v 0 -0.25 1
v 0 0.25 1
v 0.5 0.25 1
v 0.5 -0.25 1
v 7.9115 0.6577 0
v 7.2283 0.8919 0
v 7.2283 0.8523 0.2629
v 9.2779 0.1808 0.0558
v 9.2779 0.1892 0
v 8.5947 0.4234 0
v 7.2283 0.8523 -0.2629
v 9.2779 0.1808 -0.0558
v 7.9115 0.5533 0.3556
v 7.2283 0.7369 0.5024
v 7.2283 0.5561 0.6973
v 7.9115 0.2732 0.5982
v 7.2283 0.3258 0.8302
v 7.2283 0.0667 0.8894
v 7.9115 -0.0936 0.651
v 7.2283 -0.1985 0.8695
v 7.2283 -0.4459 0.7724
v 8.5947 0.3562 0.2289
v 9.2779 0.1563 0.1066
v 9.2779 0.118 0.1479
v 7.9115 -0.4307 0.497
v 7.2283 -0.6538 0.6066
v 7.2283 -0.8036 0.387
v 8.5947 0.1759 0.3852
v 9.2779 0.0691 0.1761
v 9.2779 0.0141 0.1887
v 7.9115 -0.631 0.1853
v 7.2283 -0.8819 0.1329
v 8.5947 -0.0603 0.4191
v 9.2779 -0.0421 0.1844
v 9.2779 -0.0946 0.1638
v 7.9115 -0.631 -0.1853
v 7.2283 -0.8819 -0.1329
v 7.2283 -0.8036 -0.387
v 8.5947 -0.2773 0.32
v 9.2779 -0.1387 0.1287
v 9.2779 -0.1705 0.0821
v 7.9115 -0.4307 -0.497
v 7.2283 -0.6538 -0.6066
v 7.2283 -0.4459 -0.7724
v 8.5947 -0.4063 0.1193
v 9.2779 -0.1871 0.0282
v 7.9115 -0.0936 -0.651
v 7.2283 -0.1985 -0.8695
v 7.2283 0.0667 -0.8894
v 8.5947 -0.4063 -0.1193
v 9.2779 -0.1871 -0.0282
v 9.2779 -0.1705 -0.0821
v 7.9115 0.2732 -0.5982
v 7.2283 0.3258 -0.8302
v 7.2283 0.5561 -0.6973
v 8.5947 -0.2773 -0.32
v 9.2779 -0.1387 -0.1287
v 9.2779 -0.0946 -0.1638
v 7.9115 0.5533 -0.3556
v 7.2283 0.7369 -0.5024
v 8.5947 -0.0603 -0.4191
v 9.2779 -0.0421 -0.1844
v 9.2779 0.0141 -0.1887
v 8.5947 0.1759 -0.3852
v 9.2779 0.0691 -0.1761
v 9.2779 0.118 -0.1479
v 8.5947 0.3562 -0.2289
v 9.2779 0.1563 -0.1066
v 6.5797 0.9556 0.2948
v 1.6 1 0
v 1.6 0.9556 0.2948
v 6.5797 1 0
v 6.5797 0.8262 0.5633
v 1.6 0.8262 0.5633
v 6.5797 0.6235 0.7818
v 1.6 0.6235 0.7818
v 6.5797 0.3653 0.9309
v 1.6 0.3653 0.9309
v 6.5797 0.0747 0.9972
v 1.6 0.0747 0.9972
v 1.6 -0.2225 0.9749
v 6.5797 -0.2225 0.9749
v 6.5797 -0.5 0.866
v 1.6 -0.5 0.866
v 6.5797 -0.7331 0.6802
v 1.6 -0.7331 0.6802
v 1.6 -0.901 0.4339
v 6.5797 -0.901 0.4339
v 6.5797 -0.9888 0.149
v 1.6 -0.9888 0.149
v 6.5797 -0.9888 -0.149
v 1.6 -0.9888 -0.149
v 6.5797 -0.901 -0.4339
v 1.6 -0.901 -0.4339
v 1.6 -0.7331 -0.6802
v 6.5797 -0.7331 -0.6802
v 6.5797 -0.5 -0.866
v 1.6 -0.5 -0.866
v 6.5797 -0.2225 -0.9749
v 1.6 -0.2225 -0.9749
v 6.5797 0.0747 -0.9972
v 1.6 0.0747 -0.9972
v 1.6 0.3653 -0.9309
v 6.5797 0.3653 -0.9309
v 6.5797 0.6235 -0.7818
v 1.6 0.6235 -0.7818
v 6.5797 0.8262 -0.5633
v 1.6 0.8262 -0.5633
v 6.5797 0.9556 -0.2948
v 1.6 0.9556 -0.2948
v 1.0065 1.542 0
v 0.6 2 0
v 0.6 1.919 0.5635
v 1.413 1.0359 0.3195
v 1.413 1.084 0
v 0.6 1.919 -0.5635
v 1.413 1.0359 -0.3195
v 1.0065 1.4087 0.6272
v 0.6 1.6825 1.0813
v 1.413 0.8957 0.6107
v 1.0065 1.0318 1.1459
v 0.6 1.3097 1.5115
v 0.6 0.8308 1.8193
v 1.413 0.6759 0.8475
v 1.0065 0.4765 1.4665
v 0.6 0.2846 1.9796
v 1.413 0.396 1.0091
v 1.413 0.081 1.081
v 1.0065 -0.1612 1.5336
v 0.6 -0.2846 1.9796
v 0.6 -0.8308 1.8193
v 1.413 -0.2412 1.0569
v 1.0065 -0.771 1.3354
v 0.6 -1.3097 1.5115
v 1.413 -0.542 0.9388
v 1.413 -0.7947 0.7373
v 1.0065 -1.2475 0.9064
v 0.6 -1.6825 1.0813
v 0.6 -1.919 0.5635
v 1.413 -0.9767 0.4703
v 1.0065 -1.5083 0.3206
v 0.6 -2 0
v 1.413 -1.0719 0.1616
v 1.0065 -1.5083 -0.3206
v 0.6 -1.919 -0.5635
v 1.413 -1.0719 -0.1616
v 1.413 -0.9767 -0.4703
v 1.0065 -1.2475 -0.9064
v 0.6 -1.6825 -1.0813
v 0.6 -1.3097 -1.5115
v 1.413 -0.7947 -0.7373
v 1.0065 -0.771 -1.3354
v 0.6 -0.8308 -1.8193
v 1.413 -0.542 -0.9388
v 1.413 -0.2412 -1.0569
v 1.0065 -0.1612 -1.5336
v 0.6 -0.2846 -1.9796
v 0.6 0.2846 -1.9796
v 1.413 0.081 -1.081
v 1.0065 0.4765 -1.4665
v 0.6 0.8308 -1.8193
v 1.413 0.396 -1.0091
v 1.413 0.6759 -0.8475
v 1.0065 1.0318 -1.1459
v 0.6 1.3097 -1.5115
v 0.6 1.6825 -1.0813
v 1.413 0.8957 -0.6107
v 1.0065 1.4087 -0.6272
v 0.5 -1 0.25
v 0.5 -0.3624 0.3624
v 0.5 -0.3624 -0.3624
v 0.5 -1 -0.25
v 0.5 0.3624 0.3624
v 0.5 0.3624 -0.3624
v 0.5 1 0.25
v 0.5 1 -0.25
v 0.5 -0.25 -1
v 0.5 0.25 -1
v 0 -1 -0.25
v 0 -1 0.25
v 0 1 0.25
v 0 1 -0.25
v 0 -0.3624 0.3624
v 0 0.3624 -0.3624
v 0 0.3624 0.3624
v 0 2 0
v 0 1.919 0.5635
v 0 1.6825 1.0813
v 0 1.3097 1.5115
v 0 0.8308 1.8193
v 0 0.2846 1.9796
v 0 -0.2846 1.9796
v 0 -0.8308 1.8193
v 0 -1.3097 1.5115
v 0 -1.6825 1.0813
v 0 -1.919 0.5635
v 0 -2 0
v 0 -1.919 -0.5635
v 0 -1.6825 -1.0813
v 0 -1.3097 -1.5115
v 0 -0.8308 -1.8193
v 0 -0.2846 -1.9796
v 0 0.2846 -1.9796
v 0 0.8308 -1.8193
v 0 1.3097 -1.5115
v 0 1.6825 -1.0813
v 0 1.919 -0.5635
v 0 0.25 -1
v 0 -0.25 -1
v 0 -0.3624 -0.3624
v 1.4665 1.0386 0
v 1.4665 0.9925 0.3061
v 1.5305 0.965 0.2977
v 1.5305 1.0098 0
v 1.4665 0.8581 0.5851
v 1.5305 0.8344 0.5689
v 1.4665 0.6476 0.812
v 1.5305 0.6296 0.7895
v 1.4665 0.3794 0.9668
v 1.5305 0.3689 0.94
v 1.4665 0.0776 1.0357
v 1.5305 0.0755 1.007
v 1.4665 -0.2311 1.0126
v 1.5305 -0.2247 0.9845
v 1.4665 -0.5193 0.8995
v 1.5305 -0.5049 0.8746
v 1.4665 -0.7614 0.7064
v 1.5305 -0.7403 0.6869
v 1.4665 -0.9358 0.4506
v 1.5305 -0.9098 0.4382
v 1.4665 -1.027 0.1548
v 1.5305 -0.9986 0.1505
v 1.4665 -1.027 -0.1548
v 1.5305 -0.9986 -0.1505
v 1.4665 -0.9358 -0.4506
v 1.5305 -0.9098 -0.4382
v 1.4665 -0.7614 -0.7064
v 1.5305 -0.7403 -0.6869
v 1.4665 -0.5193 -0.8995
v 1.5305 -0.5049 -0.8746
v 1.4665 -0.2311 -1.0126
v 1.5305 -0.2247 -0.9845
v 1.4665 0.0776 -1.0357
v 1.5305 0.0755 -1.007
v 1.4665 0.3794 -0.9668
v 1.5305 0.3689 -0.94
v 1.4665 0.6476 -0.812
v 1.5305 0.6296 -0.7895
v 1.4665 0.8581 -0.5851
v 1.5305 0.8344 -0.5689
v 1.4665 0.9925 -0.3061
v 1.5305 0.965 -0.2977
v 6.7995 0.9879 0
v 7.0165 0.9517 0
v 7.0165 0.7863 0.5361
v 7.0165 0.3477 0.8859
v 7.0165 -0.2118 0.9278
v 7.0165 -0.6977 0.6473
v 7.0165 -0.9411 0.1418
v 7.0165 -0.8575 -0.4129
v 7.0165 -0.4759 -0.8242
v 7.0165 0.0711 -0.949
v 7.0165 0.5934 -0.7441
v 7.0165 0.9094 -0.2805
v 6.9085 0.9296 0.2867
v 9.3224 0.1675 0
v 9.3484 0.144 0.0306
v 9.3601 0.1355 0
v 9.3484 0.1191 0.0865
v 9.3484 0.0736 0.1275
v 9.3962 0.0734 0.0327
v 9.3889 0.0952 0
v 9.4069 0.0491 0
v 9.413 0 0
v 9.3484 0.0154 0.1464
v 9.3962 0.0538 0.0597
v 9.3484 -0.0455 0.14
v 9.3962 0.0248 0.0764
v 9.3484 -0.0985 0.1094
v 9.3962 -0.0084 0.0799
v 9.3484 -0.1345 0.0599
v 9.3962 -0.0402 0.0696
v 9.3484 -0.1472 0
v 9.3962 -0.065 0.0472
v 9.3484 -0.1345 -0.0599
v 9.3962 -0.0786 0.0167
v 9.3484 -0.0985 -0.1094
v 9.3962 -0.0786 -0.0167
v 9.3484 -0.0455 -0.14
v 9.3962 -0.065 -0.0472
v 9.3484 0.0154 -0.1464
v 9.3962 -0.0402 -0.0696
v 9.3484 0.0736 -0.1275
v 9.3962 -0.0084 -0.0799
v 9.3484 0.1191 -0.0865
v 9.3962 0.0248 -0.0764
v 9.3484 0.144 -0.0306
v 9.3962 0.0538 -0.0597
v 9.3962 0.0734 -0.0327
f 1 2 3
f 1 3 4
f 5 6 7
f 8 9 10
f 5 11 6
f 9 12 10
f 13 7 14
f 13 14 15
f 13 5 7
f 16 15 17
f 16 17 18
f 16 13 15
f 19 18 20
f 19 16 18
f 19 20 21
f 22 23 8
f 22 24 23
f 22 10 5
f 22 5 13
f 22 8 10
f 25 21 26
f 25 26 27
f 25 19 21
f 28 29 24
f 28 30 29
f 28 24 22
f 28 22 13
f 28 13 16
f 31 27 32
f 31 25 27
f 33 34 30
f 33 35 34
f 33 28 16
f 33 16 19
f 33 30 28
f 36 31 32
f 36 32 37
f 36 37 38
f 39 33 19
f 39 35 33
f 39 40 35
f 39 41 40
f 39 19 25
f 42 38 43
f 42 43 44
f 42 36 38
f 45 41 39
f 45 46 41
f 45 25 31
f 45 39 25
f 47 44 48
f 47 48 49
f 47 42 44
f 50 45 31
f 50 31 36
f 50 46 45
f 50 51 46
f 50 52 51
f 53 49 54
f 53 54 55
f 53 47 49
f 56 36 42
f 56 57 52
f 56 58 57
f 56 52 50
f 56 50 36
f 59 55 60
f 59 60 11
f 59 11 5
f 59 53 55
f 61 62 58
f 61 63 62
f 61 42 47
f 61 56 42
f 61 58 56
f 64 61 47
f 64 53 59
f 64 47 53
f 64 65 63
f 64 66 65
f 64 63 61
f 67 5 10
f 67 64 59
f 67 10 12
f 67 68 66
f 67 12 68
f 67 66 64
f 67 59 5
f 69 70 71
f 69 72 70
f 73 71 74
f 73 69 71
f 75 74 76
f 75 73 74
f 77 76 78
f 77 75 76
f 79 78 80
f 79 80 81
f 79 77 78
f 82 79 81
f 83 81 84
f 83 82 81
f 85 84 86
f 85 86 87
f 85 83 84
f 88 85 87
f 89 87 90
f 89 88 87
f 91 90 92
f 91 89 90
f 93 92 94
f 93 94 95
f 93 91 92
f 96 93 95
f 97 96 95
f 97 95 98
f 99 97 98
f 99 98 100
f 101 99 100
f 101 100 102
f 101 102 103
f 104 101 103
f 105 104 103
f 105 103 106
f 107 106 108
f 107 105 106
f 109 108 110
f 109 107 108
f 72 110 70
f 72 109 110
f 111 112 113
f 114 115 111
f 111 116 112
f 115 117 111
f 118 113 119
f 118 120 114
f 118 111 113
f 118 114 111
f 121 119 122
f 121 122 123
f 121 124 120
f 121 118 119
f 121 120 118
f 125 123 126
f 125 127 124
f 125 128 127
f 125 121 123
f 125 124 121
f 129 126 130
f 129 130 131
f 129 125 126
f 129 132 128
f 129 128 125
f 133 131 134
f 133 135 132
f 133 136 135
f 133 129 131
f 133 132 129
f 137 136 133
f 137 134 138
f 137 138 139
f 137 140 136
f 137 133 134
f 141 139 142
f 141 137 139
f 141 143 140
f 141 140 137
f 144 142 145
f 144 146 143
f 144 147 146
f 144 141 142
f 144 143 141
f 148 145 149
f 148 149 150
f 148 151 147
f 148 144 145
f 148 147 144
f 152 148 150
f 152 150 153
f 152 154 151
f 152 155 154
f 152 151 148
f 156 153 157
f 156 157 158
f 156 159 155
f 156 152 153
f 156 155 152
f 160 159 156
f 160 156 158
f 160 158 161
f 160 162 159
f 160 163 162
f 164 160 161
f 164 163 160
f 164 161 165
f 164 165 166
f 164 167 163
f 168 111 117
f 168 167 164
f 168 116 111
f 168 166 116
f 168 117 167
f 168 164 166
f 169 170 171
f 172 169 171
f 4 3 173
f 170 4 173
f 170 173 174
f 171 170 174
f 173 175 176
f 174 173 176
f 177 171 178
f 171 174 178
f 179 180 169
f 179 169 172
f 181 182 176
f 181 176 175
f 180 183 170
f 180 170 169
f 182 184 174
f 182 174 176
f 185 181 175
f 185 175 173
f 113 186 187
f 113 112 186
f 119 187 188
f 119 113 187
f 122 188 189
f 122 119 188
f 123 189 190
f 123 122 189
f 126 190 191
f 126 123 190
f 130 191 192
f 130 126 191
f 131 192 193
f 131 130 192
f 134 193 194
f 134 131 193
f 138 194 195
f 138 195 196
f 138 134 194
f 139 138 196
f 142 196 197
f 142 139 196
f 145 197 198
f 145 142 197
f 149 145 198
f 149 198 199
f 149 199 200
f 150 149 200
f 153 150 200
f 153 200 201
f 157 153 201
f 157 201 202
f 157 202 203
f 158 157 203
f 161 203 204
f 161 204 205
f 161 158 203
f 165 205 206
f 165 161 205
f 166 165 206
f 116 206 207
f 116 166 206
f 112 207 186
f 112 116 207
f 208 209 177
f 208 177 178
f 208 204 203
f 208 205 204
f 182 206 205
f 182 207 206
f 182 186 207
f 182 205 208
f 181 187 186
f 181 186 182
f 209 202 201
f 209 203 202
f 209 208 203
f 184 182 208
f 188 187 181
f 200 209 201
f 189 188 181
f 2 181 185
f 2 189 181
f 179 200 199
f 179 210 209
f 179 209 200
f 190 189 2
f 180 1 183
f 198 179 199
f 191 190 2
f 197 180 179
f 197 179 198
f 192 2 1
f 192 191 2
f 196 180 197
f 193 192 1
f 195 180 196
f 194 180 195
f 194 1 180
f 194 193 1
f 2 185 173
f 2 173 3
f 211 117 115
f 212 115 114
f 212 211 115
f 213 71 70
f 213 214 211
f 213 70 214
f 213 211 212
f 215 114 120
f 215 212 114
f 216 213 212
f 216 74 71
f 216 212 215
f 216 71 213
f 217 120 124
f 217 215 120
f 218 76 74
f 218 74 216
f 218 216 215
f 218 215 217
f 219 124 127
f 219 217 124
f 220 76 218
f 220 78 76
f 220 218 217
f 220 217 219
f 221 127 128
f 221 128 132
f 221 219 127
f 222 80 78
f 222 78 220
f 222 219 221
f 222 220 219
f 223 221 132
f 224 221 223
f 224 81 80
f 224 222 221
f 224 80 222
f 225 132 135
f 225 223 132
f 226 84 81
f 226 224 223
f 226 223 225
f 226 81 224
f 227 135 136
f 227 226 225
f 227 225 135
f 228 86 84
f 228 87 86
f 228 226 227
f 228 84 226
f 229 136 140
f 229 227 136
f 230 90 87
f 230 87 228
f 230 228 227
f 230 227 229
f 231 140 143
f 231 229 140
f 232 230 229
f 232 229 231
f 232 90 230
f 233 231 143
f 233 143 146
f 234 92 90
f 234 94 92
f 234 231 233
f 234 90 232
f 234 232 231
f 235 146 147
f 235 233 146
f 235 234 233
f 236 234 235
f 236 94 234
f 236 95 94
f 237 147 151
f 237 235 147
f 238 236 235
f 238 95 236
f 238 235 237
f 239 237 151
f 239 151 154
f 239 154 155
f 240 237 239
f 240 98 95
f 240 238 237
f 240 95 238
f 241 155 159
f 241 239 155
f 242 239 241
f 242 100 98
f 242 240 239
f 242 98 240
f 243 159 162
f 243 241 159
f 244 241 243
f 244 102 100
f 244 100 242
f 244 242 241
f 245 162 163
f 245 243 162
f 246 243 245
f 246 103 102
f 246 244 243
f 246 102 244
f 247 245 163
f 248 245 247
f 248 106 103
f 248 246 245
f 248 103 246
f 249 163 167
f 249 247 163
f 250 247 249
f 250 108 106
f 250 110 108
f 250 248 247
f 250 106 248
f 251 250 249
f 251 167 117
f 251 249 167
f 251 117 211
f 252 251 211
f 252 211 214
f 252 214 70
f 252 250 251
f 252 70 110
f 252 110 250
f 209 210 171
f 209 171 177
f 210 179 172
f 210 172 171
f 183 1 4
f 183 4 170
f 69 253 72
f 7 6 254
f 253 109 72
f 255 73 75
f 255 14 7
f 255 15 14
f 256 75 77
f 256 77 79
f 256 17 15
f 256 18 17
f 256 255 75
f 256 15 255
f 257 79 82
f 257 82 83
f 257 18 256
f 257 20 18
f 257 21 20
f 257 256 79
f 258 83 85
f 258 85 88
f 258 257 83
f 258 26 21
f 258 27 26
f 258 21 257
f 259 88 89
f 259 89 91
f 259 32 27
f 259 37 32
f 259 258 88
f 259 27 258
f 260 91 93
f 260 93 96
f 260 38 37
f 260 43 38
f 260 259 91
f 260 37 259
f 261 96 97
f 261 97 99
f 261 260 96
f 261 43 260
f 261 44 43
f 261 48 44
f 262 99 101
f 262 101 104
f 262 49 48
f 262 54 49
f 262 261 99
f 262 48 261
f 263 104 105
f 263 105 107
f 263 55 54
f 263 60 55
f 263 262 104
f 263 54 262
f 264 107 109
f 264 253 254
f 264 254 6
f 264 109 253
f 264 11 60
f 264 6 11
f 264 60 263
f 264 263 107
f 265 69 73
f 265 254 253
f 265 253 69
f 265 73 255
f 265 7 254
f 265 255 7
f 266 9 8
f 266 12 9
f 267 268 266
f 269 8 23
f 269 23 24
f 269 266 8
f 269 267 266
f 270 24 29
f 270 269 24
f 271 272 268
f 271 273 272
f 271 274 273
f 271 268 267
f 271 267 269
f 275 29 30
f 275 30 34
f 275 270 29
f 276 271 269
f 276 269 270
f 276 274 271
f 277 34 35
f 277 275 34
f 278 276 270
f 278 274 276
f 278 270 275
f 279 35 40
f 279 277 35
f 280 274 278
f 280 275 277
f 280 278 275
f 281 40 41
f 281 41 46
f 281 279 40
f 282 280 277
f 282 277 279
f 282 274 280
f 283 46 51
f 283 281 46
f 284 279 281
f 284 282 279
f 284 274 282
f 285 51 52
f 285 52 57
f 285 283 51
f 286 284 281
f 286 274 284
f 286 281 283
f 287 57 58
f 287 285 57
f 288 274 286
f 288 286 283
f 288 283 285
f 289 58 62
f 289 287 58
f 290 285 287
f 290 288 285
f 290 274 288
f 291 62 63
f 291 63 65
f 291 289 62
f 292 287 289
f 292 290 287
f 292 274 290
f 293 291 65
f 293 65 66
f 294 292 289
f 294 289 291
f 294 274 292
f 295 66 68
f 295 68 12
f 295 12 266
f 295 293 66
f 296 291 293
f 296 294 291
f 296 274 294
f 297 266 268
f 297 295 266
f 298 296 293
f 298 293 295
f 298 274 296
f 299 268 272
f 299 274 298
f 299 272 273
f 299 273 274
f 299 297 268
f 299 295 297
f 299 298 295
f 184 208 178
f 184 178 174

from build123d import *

# Parameters (mm, degrees)
CUT_EXTRUDE1_DEPTH = 0.5


with BuildPart() as part:
    # Sketch1 → Revolve1 (revolve)
    with BuildSketch(Plane.XY):
        with BuildLine():
            Line((0, 0), (0, 2))
            Line((0, 2), (0.6, 2))
            Line((0.6, 2), (1.413030615, 1.084040821))
            ThreePointArc((1.413030615, 1.084040821), (1.497505597, 1.021976103), (1.6, 1))
            Line((1.6, 1), (6.579697282, 1))
            ThreePointArc((6.579697282, 1), (6.908495257, 0.972787848), (7.228345931, 0.891891892))
            Line((7.228345931, 0.891891892), (9.27789548, 0.189189189))
            ThreePointArc((9.27789548, 0.189189189), (9.37577731, 0.116247639), (9.413030615, 0))
            Line((9.413030615, 0), (0, 0))
        make_face()
    revolve(axis=Axis((-3.974685283, 0, 0), (1, 0, 0)))

    # Sketch2 → Cut-Extrude1 (cut)
    with BuildSketch(Plane.ZY):
        Polygon((-0.25, 1), (0.25, 1), (0.362422173, 0.362422173), (1, 0.25), (1, -0.25), (0.362422173, -0.362422173), (0.25, -1), (-0.25, -1), (-0.362422173, -0.362422173), (-1, -0.25), (-1, 0.25), (-0.362422173, 0.362422173), align=None)
    extrude(amount=-CUT_EXTRUDE1_DEPTH, mode=Mode.SUBTRACT)


solid = part.part
